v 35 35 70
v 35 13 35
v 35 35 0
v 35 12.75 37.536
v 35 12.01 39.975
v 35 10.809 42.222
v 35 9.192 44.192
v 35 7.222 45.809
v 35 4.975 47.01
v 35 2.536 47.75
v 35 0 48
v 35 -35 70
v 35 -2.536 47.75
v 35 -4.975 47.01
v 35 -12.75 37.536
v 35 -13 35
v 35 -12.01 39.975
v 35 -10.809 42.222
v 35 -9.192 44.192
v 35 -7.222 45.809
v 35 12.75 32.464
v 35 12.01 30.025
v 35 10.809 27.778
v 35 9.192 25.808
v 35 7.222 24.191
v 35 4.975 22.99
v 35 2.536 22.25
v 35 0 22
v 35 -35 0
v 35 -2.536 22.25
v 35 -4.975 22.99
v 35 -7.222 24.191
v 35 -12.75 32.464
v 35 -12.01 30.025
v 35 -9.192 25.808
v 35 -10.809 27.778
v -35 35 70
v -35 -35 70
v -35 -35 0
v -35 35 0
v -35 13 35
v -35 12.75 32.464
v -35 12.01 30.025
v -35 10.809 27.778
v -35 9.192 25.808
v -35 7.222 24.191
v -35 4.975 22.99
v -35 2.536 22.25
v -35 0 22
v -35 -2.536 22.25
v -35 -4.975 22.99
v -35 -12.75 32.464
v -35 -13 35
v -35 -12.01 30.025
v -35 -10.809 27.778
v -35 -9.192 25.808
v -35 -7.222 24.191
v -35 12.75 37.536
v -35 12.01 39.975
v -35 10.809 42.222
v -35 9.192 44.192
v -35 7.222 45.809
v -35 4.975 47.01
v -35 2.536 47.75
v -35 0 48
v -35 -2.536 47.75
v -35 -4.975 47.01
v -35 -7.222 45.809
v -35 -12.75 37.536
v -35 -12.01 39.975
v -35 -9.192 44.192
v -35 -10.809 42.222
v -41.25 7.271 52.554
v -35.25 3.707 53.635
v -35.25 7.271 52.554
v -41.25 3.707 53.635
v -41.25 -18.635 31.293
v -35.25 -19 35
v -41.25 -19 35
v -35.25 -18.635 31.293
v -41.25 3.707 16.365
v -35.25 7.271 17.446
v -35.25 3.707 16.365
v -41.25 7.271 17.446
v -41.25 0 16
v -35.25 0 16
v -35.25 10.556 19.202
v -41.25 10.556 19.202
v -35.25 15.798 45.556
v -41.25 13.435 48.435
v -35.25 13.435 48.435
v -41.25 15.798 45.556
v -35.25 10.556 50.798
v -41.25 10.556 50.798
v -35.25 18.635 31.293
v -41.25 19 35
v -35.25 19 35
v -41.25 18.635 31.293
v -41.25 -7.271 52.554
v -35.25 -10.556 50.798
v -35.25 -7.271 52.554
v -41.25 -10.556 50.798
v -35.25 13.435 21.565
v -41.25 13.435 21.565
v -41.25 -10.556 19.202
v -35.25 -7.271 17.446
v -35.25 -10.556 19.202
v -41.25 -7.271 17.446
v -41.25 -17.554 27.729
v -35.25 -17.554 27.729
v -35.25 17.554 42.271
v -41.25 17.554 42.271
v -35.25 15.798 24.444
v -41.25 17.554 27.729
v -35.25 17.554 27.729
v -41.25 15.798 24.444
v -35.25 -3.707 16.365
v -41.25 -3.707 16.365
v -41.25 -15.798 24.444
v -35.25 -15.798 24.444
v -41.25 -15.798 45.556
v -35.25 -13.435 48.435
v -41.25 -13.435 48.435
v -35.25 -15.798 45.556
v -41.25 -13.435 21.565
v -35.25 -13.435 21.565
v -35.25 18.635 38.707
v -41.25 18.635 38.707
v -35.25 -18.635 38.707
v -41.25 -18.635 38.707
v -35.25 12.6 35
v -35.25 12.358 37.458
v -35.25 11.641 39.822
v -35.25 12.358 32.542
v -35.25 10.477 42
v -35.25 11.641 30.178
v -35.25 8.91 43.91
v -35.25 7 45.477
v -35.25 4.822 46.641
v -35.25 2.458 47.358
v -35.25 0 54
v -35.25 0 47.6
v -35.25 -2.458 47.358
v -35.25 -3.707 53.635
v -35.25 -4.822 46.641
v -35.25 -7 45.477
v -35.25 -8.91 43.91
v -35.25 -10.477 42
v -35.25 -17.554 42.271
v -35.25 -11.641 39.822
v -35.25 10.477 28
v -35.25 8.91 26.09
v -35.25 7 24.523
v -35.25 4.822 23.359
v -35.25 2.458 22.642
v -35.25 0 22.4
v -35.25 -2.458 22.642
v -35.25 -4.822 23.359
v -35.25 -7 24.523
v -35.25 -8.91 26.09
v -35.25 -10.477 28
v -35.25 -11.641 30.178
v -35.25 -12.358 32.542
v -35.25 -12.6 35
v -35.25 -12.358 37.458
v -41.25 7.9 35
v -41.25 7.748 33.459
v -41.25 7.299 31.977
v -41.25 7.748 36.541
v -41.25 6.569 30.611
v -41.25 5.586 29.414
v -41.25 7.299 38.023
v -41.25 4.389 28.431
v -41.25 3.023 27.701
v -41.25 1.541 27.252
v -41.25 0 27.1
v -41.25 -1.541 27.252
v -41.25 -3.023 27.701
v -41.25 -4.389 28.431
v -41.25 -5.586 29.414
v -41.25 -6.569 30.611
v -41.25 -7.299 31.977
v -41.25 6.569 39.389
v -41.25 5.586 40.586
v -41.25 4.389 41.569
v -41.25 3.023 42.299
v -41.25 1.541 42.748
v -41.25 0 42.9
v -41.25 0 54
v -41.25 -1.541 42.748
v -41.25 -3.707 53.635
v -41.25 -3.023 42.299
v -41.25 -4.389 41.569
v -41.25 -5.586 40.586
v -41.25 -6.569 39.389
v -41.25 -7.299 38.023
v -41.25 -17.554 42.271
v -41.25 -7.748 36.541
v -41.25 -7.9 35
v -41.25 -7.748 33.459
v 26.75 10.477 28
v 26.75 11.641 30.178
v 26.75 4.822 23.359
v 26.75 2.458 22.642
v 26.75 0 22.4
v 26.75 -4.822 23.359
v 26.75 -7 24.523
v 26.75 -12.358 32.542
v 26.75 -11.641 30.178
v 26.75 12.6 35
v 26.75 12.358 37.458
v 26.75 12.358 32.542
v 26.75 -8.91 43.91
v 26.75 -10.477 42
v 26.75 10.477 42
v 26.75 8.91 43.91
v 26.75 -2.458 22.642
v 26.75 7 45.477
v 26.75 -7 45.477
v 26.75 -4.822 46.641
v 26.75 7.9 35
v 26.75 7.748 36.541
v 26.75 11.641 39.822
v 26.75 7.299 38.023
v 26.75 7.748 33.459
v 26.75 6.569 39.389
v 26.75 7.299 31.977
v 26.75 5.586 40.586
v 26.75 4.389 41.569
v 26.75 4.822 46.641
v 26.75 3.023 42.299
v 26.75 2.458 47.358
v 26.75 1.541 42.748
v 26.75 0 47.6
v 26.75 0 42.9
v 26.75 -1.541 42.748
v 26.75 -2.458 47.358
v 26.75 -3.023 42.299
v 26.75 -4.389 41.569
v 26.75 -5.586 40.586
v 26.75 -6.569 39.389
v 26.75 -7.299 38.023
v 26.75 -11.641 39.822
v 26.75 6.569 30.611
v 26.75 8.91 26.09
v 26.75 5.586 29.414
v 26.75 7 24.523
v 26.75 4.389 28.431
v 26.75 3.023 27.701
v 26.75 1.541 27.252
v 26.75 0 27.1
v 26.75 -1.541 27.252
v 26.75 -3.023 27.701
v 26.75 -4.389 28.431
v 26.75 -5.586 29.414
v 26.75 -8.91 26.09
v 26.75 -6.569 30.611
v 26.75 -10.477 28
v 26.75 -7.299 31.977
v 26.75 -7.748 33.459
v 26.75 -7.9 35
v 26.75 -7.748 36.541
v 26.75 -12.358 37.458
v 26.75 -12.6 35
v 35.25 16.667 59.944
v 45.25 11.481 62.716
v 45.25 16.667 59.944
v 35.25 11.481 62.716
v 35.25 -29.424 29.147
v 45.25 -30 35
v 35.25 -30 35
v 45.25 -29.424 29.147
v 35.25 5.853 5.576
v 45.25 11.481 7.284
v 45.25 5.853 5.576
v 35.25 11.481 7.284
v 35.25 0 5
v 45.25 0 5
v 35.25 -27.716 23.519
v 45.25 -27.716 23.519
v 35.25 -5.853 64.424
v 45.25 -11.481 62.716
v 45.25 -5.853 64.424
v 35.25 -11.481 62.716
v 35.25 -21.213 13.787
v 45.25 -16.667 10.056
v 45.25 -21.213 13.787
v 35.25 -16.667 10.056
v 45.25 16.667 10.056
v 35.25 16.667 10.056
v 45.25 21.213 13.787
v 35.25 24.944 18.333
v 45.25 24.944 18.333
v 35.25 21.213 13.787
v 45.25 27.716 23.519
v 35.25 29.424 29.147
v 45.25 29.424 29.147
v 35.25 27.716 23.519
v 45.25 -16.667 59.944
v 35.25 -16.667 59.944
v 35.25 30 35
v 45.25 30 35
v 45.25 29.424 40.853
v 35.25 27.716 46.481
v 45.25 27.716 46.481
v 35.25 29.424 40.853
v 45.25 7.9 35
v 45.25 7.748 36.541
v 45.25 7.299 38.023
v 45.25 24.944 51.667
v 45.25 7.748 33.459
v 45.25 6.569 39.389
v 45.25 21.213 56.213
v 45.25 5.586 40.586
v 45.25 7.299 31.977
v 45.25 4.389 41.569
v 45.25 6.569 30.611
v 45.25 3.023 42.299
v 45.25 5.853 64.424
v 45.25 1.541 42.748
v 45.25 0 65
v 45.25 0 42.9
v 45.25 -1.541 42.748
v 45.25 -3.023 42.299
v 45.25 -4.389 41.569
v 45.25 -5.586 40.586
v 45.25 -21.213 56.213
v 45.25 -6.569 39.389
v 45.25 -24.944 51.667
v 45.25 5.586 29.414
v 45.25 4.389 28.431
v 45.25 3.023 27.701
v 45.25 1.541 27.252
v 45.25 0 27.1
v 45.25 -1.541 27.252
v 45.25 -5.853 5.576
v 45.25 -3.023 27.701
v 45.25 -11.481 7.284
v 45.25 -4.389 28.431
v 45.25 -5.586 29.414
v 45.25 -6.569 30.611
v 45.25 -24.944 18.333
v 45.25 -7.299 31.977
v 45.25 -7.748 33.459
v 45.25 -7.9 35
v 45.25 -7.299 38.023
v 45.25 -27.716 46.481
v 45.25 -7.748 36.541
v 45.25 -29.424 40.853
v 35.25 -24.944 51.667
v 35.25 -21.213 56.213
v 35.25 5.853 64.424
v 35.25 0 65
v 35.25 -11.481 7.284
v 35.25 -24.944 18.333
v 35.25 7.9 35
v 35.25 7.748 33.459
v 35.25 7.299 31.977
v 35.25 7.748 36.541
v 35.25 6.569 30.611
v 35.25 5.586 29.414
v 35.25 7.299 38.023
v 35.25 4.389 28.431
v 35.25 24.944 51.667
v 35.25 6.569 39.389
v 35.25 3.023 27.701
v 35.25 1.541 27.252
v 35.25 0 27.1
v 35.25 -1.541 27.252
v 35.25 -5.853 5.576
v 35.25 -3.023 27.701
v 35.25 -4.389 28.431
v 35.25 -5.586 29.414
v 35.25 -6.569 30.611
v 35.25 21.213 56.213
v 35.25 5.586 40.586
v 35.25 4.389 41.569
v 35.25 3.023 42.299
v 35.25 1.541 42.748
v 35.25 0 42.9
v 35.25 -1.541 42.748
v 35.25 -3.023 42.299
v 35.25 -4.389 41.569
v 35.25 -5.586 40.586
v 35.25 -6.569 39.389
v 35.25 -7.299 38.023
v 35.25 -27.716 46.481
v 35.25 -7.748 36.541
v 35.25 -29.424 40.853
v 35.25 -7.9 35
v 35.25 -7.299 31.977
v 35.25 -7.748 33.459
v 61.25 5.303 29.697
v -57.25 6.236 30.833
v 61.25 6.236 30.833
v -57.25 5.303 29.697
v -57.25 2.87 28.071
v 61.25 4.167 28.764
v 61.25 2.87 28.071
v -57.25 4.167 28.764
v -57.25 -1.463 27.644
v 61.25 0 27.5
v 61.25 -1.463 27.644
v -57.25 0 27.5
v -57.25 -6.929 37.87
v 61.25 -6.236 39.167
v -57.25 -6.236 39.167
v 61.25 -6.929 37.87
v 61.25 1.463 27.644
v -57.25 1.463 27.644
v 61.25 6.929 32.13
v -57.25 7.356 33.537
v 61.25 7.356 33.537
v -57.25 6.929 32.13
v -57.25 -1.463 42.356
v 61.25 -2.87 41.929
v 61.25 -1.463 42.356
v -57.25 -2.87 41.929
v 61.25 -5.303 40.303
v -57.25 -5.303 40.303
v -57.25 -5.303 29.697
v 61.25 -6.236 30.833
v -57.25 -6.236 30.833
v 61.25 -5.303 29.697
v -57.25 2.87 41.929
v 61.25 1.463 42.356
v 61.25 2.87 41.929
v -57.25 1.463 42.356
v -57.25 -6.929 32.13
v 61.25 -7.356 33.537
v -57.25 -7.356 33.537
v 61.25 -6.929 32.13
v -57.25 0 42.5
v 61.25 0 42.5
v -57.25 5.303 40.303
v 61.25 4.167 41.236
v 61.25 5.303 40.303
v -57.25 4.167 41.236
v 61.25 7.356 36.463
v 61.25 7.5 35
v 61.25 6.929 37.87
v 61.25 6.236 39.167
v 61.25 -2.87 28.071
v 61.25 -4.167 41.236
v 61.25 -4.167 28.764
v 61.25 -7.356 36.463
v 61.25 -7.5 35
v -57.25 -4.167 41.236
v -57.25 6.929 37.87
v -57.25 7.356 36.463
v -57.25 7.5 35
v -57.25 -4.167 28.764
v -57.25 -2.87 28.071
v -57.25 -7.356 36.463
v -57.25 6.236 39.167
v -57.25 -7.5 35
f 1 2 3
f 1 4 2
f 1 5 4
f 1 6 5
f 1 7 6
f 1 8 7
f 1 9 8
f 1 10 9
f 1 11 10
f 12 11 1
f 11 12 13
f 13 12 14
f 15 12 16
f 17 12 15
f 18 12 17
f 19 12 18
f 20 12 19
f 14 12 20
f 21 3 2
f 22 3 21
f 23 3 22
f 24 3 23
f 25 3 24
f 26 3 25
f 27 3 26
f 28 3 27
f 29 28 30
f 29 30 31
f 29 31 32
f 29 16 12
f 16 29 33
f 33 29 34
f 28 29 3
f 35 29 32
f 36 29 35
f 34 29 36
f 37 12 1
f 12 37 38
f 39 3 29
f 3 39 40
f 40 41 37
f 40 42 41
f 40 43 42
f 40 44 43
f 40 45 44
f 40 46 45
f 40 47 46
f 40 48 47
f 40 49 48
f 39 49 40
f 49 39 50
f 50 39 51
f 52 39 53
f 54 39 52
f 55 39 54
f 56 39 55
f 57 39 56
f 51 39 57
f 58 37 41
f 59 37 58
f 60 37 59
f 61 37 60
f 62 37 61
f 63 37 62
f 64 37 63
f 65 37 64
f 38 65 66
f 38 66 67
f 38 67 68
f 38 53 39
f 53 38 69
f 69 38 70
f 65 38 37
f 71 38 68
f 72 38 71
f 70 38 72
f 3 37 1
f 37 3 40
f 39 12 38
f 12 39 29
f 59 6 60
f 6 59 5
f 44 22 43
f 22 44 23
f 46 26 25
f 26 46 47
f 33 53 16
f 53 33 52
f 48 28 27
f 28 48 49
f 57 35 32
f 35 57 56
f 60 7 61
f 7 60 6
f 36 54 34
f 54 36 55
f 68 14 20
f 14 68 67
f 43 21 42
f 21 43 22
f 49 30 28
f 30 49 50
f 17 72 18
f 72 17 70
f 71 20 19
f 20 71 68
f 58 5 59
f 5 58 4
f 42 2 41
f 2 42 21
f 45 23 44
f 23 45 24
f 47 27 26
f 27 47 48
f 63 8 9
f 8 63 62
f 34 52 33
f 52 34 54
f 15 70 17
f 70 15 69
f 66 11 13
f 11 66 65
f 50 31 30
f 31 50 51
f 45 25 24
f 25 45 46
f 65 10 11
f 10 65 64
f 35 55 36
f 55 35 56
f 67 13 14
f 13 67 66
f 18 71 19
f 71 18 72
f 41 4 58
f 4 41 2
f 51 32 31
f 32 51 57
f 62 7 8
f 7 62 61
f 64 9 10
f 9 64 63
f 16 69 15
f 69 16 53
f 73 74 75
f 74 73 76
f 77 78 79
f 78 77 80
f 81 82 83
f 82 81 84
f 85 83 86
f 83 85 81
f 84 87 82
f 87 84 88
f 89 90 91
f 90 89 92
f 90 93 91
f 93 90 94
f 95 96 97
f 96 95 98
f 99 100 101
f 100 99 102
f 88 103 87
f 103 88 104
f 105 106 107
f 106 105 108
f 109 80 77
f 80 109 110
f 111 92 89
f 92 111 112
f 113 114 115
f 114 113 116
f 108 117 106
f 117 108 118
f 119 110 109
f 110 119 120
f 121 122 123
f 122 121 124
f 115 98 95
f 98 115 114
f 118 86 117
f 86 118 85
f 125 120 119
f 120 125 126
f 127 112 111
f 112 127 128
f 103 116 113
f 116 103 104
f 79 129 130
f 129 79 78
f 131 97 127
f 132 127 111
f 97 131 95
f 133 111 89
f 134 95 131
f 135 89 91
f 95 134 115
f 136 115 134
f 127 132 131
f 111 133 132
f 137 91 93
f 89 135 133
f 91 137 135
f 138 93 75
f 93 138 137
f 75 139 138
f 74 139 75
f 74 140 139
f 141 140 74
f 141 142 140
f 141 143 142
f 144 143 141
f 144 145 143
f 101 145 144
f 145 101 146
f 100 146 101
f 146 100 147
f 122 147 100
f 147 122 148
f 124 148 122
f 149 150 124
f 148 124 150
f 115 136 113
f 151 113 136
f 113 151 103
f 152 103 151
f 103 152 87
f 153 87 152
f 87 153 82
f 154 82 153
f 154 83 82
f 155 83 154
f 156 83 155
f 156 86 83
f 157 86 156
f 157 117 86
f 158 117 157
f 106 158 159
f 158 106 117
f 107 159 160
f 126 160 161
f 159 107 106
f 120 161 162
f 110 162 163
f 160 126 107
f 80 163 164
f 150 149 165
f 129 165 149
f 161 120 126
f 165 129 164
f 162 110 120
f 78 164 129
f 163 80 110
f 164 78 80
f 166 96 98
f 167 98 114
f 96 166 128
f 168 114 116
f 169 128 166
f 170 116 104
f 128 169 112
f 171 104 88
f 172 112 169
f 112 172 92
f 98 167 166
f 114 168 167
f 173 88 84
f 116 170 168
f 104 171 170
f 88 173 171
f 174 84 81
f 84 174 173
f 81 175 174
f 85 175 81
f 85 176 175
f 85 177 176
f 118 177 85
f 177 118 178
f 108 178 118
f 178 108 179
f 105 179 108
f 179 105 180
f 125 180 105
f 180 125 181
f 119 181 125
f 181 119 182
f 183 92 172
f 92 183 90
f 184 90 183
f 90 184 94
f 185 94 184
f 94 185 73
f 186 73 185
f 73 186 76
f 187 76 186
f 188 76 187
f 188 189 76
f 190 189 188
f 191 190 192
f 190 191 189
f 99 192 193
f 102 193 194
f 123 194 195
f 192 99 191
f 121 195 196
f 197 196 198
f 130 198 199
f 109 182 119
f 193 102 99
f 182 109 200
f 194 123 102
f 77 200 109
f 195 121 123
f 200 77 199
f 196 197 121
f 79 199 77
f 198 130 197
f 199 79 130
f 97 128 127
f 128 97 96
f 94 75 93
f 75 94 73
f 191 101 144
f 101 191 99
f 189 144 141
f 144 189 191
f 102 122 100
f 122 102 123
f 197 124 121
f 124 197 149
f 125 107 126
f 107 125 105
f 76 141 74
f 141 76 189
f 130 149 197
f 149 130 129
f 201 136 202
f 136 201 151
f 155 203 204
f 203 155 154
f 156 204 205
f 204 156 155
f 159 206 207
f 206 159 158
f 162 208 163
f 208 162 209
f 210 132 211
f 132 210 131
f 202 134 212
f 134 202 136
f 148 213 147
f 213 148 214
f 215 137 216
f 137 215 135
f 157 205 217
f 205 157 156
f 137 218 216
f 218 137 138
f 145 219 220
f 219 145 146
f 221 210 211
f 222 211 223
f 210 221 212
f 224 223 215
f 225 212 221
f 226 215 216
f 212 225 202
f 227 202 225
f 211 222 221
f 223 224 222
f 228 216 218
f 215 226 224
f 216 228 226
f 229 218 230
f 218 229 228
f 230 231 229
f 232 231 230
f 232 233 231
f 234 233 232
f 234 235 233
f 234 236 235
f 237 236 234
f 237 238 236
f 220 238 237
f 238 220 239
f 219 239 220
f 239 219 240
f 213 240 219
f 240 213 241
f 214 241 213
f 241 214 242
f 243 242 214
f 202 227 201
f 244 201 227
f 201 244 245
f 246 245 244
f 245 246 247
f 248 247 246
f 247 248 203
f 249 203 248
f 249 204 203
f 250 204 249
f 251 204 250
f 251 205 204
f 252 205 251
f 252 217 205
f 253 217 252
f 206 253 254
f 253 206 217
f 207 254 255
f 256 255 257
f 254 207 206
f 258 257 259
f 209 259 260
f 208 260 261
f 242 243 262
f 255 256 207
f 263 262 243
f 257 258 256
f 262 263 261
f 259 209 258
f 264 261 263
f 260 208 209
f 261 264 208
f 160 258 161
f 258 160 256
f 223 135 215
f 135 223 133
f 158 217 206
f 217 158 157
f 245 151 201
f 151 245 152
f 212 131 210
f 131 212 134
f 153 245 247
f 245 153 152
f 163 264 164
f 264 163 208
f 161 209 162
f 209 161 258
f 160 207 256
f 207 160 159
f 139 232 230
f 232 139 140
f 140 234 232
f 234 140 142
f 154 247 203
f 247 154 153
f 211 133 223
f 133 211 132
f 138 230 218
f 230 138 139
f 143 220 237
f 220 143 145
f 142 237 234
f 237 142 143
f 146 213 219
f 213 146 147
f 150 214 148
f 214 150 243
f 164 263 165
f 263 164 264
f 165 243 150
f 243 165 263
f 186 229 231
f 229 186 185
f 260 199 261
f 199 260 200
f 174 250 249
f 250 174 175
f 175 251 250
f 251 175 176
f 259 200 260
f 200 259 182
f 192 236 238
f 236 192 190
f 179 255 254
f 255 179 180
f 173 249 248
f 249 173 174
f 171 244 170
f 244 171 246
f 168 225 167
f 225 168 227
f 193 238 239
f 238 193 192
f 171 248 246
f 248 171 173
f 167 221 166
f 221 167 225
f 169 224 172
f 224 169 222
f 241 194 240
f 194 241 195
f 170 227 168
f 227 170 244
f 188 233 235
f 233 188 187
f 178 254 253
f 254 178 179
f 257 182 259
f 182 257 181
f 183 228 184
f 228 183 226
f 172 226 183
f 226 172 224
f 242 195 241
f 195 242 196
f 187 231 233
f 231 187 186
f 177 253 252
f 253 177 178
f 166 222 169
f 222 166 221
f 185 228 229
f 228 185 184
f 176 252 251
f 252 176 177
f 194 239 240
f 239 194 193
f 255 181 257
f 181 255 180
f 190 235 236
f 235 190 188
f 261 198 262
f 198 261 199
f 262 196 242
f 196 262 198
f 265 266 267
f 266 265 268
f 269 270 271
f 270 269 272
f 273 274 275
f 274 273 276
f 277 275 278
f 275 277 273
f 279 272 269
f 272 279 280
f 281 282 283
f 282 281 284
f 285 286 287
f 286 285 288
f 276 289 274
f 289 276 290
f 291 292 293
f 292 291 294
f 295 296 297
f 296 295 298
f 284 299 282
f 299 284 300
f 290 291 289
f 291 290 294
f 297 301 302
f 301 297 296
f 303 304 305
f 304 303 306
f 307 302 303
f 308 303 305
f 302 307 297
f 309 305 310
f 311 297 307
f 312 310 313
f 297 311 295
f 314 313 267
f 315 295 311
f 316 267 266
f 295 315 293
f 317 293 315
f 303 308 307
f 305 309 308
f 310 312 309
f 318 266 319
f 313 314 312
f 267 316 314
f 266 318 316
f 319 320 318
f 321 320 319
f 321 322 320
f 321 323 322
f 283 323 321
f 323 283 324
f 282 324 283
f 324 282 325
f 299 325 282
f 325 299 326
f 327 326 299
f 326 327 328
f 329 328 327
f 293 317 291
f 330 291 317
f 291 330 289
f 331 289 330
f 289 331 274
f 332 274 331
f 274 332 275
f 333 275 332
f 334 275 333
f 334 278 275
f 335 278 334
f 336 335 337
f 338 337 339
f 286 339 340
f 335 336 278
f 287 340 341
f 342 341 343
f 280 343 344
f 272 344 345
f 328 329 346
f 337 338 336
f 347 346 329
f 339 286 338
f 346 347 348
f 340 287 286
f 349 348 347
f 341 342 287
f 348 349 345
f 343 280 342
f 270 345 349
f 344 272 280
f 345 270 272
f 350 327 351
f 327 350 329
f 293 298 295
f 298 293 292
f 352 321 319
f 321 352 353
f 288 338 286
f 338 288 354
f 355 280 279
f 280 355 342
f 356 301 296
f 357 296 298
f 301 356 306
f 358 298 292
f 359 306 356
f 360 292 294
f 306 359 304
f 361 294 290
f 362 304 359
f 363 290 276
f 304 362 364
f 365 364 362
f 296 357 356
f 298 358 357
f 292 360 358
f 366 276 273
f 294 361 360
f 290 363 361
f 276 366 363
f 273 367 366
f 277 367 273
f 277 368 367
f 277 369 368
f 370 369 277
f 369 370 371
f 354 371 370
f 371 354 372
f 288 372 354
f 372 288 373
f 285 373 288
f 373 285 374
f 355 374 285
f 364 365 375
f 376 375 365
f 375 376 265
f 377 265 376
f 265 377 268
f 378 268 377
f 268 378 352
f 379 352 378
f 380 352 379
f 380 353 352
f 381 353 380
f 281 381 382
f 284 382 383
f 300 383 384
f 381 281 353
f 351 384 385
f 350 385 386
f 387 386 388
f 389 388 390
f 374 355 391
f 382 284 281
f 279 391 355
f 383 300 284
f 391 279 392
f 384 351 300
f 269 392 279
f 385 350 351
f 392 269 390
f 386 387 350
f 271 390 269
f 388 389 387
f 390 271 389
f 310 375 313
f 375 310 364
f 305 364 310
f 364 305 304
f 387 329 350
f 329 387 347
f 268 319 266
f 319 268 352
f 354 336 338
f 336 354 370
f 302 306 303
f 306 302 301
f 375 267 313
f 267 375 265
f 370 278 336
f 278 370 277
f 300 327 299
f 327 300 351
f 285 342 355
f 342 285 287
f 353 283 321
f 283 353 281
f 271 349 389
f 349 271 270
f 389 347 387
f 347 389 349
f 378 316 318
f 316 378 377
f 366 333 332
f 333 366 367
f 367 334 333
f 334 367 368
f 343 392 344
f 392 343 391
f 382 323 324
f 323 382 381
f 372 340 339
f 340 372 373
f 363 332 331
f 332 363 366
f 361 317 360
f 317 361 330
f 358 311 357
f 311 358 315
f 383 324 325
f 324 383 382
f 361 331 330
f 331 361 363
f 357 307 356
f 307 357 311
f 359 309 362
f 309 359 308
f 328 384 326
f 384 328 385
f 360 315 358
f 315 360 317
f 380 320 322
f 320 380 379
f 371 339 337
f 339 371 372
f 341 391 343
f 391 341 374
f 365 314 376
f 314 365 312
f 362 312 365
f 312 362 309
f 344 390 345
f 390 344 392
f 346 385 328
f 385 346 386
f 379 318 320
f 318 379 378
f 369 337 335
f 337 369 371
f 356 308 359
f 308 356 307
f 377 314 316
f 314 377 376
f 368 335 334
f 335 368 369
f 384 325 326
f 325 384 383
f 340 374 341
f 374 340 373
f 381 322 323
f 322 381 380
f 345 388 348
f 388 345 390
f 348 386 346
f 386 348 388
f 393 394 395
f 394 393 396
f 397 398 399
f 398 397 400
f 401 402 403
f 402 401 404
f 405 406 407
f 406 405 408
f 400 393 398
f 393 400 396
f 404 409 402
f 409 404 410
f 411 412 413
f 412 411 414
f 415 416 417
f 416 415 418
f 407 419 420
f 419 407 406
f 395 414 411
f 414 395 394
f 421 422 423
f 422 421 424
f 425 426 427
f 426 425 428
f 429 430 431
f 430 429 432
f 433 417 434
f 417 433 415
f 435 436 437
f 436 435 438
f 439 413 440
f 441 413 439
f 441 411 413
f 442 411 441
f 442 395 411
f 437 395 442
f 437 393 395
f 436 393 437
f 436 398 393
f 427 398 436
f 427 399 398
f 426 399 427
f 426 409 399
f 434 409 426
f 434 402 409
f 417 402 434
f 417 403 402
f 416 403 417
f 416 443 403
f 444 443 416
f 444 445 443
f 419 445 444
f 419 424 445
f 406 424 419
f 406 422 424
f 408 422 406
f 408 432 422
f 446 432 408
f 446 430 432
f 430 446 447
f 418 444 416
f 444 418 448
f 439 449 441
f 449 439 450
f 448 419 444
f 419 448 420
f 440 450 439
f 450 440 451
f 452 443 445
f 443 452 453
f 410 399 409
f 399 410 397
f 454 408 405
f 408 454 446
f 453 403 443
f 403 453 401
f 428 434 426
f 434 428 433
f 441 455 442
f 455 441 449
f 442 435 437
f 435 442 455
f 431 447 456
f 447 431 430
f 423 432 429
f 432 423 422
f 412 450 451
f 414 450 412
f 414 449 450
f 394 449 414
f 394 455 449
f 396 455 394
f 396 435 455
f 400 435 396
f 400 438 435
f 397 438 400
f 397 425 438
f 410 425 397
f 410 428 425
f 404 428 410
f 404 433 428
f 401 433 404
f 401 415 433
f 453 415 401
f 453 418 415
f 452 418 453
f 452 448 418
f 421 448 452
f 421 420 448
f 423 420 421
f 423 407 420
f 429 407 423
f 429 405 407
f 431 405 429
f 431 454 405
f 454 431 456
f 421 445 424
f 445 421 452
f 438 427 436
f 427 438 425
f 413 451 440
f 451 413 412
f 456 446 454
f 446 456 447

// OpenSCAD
$fn = 32;

// ------------------------------------------------------------------------
// Bushed housing: 70 x 70 x 70 mm housing, bushing d25.2
// Every part is its own module, assembly() places them once.
// ------------------------------------------------------------------------

// --- part 1 ---
module housing() {
  difference() {
    translate([-35, -35, 0]) cube([70, 70, 70]);
    translate([0, 0, 35]) rotate([0, 90, 0]) cylinder(h = 72, d = 26, center = true);
  }
}

// --- part 2 ---
module bushing() {
  difference() {
    union() {
      cylinder(h = 6, d = 38);
      translate([0, 0, 6]) cylinder(h = 62, d = 25.2);
    }
    translate([0, 0, -1]) cylinder(h = 70, d = 15.8);
  }
}

// --- part 3 ---
module shaft() {
  translate([0, 0, -59.25]) cylinder(h = 118.5, d = 15);
}

// --- part 4 ---
module cover() {
  difference() {
    cylinder(h = 10, d = 60);
    translate([0, 0, -1]) cylinder(h = 12, d = 15.8);
  }
}

// --- assembly ---
module assembly() {
  translate([0, 0, 0]) rotate([0, 0, 0]) housing();
  translate([-41.25, 0, 35]) rotate([0, 90, 0]) bushing();
  translate([2, 0, 35]) rotate([0, 90, 0]) shaft();
  translate([35.25, 0, 35]) rotate([0, 90, 0]) cover();
}

assembly();
